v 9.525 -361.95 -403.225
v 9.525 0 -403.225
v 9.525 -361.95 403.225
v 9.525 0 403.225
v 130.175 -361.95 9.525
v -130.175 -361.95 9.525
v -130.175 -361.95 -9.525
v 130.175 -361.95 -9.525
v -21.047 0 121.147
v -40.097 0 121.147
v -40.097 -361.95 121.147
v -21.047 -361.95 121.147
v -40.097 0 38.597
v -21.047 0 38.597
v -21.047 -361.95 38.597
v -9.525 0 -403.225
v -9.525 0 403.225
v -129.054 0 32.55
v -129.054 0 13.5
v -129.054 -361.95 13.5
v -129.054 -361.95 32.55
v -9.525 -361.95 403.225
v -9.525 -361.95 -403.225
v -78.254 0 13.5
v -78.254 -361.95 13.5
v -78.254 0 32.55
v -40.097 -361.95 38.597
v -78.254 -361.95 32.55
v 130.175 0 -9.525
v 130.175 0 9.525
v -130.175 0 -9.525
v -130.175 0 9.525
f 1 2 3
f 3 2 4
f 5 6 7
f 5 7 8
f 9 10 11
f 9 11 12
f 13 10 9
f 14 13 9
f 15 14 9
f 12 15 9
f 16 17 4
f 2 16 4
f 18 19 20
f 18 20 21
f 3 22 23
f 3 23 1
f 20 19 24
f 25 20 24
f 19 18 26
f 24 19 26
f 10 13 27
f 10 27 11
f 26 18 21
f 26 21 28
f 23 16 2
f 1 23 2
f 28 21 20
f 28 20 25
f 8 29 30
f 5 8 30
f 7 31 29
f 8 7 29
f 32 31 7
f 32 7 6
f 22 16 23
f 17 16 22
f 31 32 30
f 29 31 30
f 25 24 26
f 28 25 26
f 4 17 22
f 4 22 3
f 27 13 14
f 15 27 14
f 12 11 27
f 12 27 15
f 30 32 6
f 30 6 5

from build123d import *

# Parameters (mm, degrees)
F0_W     = 19.05
F0_H     = 806.45
F1_DEPTH = 361.95
F2_W     = 260.35
F2_H     = 19.05
F3_DEPTH = 361.95
F4_W     = 50.8
F4_H     = 19.05
F5_DEPTH = 361.95
F6_W     = 19.05
F6_H     = 82.55
F7_DEPTH = 361.95


with BuildPart() as f1:
    # F0 (on Front) → F1 (new body)
    with BuildSketch(Plane.XZ):
        Rectangle(F0_W, F0_H)
    extrude(amount=F1_DEPTH)


with BuildPart() as f3:
    # F2 (on Front) → F3 (new body)
    with BuildSketch(Plane.XZ):
        Rectangle(F2_W, F2_H)
    extrude(amount=F3_DEPTH)


with BuildPart() as f5:
    # F4 (on Front) → F5 (new body)
    with BuildSketch(Plane.XZ):
        with Locations((-103.654143, 23.02507)):
            Rectangle(F4_W, F4_H)
    extrude(amount=F5_DEPTH)


with BuildPart() as f7:
    # F6 (on Front) → F7 (new body)
    with BuildSketch(Plane.XZ):
        with Locations((-30.572268, 79.871871)):
            Rectangle(F6_W, F6_H)
    extrude(amount=F7_DEPTH)


solid = Compound([f1.part, f3.part, f5.part, f7.part])
